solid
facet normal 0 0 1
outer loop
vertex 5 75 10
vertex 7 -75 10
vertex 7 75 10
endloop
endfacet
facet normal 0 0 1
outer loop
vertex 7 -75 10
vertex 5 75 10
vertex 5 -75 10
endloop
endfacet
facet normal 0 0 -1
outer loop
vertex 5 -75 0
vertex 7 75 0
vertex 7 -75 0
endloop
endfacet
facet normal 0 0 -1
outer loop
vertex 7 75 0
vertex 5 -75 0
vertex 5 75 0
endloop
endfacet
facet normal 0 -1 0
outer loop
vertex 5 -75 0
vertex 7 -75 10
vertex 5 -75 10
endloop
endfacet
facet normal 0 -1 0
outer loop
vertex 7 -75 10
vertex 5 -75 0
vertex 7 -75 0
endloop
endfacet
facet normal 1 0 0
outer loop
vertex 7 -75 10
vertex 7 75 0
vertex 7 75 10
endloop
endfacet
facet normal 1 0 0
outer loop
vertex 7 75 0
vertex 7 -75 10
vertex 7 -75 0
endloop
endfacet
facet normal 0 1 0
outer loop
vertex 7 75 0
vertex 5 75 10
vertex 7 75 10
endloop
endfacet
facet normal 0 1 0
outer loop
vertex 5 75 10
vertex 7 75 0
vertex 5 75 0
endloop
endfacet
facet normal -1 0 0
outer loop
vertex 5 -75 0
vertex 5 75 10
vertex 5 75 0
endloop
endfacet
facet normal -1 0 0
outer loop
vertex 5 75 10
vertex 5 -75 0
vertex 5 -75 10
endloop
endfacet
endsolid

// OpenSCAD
y_length = 150;
height = 10;

translate([-5, 0, 0]) {
  for (i = [2:2]) {
    translate([(i-1) *10, -y_length / 2, 0]) {
      cube([i, y_length, height], false);
    }
  }
}
